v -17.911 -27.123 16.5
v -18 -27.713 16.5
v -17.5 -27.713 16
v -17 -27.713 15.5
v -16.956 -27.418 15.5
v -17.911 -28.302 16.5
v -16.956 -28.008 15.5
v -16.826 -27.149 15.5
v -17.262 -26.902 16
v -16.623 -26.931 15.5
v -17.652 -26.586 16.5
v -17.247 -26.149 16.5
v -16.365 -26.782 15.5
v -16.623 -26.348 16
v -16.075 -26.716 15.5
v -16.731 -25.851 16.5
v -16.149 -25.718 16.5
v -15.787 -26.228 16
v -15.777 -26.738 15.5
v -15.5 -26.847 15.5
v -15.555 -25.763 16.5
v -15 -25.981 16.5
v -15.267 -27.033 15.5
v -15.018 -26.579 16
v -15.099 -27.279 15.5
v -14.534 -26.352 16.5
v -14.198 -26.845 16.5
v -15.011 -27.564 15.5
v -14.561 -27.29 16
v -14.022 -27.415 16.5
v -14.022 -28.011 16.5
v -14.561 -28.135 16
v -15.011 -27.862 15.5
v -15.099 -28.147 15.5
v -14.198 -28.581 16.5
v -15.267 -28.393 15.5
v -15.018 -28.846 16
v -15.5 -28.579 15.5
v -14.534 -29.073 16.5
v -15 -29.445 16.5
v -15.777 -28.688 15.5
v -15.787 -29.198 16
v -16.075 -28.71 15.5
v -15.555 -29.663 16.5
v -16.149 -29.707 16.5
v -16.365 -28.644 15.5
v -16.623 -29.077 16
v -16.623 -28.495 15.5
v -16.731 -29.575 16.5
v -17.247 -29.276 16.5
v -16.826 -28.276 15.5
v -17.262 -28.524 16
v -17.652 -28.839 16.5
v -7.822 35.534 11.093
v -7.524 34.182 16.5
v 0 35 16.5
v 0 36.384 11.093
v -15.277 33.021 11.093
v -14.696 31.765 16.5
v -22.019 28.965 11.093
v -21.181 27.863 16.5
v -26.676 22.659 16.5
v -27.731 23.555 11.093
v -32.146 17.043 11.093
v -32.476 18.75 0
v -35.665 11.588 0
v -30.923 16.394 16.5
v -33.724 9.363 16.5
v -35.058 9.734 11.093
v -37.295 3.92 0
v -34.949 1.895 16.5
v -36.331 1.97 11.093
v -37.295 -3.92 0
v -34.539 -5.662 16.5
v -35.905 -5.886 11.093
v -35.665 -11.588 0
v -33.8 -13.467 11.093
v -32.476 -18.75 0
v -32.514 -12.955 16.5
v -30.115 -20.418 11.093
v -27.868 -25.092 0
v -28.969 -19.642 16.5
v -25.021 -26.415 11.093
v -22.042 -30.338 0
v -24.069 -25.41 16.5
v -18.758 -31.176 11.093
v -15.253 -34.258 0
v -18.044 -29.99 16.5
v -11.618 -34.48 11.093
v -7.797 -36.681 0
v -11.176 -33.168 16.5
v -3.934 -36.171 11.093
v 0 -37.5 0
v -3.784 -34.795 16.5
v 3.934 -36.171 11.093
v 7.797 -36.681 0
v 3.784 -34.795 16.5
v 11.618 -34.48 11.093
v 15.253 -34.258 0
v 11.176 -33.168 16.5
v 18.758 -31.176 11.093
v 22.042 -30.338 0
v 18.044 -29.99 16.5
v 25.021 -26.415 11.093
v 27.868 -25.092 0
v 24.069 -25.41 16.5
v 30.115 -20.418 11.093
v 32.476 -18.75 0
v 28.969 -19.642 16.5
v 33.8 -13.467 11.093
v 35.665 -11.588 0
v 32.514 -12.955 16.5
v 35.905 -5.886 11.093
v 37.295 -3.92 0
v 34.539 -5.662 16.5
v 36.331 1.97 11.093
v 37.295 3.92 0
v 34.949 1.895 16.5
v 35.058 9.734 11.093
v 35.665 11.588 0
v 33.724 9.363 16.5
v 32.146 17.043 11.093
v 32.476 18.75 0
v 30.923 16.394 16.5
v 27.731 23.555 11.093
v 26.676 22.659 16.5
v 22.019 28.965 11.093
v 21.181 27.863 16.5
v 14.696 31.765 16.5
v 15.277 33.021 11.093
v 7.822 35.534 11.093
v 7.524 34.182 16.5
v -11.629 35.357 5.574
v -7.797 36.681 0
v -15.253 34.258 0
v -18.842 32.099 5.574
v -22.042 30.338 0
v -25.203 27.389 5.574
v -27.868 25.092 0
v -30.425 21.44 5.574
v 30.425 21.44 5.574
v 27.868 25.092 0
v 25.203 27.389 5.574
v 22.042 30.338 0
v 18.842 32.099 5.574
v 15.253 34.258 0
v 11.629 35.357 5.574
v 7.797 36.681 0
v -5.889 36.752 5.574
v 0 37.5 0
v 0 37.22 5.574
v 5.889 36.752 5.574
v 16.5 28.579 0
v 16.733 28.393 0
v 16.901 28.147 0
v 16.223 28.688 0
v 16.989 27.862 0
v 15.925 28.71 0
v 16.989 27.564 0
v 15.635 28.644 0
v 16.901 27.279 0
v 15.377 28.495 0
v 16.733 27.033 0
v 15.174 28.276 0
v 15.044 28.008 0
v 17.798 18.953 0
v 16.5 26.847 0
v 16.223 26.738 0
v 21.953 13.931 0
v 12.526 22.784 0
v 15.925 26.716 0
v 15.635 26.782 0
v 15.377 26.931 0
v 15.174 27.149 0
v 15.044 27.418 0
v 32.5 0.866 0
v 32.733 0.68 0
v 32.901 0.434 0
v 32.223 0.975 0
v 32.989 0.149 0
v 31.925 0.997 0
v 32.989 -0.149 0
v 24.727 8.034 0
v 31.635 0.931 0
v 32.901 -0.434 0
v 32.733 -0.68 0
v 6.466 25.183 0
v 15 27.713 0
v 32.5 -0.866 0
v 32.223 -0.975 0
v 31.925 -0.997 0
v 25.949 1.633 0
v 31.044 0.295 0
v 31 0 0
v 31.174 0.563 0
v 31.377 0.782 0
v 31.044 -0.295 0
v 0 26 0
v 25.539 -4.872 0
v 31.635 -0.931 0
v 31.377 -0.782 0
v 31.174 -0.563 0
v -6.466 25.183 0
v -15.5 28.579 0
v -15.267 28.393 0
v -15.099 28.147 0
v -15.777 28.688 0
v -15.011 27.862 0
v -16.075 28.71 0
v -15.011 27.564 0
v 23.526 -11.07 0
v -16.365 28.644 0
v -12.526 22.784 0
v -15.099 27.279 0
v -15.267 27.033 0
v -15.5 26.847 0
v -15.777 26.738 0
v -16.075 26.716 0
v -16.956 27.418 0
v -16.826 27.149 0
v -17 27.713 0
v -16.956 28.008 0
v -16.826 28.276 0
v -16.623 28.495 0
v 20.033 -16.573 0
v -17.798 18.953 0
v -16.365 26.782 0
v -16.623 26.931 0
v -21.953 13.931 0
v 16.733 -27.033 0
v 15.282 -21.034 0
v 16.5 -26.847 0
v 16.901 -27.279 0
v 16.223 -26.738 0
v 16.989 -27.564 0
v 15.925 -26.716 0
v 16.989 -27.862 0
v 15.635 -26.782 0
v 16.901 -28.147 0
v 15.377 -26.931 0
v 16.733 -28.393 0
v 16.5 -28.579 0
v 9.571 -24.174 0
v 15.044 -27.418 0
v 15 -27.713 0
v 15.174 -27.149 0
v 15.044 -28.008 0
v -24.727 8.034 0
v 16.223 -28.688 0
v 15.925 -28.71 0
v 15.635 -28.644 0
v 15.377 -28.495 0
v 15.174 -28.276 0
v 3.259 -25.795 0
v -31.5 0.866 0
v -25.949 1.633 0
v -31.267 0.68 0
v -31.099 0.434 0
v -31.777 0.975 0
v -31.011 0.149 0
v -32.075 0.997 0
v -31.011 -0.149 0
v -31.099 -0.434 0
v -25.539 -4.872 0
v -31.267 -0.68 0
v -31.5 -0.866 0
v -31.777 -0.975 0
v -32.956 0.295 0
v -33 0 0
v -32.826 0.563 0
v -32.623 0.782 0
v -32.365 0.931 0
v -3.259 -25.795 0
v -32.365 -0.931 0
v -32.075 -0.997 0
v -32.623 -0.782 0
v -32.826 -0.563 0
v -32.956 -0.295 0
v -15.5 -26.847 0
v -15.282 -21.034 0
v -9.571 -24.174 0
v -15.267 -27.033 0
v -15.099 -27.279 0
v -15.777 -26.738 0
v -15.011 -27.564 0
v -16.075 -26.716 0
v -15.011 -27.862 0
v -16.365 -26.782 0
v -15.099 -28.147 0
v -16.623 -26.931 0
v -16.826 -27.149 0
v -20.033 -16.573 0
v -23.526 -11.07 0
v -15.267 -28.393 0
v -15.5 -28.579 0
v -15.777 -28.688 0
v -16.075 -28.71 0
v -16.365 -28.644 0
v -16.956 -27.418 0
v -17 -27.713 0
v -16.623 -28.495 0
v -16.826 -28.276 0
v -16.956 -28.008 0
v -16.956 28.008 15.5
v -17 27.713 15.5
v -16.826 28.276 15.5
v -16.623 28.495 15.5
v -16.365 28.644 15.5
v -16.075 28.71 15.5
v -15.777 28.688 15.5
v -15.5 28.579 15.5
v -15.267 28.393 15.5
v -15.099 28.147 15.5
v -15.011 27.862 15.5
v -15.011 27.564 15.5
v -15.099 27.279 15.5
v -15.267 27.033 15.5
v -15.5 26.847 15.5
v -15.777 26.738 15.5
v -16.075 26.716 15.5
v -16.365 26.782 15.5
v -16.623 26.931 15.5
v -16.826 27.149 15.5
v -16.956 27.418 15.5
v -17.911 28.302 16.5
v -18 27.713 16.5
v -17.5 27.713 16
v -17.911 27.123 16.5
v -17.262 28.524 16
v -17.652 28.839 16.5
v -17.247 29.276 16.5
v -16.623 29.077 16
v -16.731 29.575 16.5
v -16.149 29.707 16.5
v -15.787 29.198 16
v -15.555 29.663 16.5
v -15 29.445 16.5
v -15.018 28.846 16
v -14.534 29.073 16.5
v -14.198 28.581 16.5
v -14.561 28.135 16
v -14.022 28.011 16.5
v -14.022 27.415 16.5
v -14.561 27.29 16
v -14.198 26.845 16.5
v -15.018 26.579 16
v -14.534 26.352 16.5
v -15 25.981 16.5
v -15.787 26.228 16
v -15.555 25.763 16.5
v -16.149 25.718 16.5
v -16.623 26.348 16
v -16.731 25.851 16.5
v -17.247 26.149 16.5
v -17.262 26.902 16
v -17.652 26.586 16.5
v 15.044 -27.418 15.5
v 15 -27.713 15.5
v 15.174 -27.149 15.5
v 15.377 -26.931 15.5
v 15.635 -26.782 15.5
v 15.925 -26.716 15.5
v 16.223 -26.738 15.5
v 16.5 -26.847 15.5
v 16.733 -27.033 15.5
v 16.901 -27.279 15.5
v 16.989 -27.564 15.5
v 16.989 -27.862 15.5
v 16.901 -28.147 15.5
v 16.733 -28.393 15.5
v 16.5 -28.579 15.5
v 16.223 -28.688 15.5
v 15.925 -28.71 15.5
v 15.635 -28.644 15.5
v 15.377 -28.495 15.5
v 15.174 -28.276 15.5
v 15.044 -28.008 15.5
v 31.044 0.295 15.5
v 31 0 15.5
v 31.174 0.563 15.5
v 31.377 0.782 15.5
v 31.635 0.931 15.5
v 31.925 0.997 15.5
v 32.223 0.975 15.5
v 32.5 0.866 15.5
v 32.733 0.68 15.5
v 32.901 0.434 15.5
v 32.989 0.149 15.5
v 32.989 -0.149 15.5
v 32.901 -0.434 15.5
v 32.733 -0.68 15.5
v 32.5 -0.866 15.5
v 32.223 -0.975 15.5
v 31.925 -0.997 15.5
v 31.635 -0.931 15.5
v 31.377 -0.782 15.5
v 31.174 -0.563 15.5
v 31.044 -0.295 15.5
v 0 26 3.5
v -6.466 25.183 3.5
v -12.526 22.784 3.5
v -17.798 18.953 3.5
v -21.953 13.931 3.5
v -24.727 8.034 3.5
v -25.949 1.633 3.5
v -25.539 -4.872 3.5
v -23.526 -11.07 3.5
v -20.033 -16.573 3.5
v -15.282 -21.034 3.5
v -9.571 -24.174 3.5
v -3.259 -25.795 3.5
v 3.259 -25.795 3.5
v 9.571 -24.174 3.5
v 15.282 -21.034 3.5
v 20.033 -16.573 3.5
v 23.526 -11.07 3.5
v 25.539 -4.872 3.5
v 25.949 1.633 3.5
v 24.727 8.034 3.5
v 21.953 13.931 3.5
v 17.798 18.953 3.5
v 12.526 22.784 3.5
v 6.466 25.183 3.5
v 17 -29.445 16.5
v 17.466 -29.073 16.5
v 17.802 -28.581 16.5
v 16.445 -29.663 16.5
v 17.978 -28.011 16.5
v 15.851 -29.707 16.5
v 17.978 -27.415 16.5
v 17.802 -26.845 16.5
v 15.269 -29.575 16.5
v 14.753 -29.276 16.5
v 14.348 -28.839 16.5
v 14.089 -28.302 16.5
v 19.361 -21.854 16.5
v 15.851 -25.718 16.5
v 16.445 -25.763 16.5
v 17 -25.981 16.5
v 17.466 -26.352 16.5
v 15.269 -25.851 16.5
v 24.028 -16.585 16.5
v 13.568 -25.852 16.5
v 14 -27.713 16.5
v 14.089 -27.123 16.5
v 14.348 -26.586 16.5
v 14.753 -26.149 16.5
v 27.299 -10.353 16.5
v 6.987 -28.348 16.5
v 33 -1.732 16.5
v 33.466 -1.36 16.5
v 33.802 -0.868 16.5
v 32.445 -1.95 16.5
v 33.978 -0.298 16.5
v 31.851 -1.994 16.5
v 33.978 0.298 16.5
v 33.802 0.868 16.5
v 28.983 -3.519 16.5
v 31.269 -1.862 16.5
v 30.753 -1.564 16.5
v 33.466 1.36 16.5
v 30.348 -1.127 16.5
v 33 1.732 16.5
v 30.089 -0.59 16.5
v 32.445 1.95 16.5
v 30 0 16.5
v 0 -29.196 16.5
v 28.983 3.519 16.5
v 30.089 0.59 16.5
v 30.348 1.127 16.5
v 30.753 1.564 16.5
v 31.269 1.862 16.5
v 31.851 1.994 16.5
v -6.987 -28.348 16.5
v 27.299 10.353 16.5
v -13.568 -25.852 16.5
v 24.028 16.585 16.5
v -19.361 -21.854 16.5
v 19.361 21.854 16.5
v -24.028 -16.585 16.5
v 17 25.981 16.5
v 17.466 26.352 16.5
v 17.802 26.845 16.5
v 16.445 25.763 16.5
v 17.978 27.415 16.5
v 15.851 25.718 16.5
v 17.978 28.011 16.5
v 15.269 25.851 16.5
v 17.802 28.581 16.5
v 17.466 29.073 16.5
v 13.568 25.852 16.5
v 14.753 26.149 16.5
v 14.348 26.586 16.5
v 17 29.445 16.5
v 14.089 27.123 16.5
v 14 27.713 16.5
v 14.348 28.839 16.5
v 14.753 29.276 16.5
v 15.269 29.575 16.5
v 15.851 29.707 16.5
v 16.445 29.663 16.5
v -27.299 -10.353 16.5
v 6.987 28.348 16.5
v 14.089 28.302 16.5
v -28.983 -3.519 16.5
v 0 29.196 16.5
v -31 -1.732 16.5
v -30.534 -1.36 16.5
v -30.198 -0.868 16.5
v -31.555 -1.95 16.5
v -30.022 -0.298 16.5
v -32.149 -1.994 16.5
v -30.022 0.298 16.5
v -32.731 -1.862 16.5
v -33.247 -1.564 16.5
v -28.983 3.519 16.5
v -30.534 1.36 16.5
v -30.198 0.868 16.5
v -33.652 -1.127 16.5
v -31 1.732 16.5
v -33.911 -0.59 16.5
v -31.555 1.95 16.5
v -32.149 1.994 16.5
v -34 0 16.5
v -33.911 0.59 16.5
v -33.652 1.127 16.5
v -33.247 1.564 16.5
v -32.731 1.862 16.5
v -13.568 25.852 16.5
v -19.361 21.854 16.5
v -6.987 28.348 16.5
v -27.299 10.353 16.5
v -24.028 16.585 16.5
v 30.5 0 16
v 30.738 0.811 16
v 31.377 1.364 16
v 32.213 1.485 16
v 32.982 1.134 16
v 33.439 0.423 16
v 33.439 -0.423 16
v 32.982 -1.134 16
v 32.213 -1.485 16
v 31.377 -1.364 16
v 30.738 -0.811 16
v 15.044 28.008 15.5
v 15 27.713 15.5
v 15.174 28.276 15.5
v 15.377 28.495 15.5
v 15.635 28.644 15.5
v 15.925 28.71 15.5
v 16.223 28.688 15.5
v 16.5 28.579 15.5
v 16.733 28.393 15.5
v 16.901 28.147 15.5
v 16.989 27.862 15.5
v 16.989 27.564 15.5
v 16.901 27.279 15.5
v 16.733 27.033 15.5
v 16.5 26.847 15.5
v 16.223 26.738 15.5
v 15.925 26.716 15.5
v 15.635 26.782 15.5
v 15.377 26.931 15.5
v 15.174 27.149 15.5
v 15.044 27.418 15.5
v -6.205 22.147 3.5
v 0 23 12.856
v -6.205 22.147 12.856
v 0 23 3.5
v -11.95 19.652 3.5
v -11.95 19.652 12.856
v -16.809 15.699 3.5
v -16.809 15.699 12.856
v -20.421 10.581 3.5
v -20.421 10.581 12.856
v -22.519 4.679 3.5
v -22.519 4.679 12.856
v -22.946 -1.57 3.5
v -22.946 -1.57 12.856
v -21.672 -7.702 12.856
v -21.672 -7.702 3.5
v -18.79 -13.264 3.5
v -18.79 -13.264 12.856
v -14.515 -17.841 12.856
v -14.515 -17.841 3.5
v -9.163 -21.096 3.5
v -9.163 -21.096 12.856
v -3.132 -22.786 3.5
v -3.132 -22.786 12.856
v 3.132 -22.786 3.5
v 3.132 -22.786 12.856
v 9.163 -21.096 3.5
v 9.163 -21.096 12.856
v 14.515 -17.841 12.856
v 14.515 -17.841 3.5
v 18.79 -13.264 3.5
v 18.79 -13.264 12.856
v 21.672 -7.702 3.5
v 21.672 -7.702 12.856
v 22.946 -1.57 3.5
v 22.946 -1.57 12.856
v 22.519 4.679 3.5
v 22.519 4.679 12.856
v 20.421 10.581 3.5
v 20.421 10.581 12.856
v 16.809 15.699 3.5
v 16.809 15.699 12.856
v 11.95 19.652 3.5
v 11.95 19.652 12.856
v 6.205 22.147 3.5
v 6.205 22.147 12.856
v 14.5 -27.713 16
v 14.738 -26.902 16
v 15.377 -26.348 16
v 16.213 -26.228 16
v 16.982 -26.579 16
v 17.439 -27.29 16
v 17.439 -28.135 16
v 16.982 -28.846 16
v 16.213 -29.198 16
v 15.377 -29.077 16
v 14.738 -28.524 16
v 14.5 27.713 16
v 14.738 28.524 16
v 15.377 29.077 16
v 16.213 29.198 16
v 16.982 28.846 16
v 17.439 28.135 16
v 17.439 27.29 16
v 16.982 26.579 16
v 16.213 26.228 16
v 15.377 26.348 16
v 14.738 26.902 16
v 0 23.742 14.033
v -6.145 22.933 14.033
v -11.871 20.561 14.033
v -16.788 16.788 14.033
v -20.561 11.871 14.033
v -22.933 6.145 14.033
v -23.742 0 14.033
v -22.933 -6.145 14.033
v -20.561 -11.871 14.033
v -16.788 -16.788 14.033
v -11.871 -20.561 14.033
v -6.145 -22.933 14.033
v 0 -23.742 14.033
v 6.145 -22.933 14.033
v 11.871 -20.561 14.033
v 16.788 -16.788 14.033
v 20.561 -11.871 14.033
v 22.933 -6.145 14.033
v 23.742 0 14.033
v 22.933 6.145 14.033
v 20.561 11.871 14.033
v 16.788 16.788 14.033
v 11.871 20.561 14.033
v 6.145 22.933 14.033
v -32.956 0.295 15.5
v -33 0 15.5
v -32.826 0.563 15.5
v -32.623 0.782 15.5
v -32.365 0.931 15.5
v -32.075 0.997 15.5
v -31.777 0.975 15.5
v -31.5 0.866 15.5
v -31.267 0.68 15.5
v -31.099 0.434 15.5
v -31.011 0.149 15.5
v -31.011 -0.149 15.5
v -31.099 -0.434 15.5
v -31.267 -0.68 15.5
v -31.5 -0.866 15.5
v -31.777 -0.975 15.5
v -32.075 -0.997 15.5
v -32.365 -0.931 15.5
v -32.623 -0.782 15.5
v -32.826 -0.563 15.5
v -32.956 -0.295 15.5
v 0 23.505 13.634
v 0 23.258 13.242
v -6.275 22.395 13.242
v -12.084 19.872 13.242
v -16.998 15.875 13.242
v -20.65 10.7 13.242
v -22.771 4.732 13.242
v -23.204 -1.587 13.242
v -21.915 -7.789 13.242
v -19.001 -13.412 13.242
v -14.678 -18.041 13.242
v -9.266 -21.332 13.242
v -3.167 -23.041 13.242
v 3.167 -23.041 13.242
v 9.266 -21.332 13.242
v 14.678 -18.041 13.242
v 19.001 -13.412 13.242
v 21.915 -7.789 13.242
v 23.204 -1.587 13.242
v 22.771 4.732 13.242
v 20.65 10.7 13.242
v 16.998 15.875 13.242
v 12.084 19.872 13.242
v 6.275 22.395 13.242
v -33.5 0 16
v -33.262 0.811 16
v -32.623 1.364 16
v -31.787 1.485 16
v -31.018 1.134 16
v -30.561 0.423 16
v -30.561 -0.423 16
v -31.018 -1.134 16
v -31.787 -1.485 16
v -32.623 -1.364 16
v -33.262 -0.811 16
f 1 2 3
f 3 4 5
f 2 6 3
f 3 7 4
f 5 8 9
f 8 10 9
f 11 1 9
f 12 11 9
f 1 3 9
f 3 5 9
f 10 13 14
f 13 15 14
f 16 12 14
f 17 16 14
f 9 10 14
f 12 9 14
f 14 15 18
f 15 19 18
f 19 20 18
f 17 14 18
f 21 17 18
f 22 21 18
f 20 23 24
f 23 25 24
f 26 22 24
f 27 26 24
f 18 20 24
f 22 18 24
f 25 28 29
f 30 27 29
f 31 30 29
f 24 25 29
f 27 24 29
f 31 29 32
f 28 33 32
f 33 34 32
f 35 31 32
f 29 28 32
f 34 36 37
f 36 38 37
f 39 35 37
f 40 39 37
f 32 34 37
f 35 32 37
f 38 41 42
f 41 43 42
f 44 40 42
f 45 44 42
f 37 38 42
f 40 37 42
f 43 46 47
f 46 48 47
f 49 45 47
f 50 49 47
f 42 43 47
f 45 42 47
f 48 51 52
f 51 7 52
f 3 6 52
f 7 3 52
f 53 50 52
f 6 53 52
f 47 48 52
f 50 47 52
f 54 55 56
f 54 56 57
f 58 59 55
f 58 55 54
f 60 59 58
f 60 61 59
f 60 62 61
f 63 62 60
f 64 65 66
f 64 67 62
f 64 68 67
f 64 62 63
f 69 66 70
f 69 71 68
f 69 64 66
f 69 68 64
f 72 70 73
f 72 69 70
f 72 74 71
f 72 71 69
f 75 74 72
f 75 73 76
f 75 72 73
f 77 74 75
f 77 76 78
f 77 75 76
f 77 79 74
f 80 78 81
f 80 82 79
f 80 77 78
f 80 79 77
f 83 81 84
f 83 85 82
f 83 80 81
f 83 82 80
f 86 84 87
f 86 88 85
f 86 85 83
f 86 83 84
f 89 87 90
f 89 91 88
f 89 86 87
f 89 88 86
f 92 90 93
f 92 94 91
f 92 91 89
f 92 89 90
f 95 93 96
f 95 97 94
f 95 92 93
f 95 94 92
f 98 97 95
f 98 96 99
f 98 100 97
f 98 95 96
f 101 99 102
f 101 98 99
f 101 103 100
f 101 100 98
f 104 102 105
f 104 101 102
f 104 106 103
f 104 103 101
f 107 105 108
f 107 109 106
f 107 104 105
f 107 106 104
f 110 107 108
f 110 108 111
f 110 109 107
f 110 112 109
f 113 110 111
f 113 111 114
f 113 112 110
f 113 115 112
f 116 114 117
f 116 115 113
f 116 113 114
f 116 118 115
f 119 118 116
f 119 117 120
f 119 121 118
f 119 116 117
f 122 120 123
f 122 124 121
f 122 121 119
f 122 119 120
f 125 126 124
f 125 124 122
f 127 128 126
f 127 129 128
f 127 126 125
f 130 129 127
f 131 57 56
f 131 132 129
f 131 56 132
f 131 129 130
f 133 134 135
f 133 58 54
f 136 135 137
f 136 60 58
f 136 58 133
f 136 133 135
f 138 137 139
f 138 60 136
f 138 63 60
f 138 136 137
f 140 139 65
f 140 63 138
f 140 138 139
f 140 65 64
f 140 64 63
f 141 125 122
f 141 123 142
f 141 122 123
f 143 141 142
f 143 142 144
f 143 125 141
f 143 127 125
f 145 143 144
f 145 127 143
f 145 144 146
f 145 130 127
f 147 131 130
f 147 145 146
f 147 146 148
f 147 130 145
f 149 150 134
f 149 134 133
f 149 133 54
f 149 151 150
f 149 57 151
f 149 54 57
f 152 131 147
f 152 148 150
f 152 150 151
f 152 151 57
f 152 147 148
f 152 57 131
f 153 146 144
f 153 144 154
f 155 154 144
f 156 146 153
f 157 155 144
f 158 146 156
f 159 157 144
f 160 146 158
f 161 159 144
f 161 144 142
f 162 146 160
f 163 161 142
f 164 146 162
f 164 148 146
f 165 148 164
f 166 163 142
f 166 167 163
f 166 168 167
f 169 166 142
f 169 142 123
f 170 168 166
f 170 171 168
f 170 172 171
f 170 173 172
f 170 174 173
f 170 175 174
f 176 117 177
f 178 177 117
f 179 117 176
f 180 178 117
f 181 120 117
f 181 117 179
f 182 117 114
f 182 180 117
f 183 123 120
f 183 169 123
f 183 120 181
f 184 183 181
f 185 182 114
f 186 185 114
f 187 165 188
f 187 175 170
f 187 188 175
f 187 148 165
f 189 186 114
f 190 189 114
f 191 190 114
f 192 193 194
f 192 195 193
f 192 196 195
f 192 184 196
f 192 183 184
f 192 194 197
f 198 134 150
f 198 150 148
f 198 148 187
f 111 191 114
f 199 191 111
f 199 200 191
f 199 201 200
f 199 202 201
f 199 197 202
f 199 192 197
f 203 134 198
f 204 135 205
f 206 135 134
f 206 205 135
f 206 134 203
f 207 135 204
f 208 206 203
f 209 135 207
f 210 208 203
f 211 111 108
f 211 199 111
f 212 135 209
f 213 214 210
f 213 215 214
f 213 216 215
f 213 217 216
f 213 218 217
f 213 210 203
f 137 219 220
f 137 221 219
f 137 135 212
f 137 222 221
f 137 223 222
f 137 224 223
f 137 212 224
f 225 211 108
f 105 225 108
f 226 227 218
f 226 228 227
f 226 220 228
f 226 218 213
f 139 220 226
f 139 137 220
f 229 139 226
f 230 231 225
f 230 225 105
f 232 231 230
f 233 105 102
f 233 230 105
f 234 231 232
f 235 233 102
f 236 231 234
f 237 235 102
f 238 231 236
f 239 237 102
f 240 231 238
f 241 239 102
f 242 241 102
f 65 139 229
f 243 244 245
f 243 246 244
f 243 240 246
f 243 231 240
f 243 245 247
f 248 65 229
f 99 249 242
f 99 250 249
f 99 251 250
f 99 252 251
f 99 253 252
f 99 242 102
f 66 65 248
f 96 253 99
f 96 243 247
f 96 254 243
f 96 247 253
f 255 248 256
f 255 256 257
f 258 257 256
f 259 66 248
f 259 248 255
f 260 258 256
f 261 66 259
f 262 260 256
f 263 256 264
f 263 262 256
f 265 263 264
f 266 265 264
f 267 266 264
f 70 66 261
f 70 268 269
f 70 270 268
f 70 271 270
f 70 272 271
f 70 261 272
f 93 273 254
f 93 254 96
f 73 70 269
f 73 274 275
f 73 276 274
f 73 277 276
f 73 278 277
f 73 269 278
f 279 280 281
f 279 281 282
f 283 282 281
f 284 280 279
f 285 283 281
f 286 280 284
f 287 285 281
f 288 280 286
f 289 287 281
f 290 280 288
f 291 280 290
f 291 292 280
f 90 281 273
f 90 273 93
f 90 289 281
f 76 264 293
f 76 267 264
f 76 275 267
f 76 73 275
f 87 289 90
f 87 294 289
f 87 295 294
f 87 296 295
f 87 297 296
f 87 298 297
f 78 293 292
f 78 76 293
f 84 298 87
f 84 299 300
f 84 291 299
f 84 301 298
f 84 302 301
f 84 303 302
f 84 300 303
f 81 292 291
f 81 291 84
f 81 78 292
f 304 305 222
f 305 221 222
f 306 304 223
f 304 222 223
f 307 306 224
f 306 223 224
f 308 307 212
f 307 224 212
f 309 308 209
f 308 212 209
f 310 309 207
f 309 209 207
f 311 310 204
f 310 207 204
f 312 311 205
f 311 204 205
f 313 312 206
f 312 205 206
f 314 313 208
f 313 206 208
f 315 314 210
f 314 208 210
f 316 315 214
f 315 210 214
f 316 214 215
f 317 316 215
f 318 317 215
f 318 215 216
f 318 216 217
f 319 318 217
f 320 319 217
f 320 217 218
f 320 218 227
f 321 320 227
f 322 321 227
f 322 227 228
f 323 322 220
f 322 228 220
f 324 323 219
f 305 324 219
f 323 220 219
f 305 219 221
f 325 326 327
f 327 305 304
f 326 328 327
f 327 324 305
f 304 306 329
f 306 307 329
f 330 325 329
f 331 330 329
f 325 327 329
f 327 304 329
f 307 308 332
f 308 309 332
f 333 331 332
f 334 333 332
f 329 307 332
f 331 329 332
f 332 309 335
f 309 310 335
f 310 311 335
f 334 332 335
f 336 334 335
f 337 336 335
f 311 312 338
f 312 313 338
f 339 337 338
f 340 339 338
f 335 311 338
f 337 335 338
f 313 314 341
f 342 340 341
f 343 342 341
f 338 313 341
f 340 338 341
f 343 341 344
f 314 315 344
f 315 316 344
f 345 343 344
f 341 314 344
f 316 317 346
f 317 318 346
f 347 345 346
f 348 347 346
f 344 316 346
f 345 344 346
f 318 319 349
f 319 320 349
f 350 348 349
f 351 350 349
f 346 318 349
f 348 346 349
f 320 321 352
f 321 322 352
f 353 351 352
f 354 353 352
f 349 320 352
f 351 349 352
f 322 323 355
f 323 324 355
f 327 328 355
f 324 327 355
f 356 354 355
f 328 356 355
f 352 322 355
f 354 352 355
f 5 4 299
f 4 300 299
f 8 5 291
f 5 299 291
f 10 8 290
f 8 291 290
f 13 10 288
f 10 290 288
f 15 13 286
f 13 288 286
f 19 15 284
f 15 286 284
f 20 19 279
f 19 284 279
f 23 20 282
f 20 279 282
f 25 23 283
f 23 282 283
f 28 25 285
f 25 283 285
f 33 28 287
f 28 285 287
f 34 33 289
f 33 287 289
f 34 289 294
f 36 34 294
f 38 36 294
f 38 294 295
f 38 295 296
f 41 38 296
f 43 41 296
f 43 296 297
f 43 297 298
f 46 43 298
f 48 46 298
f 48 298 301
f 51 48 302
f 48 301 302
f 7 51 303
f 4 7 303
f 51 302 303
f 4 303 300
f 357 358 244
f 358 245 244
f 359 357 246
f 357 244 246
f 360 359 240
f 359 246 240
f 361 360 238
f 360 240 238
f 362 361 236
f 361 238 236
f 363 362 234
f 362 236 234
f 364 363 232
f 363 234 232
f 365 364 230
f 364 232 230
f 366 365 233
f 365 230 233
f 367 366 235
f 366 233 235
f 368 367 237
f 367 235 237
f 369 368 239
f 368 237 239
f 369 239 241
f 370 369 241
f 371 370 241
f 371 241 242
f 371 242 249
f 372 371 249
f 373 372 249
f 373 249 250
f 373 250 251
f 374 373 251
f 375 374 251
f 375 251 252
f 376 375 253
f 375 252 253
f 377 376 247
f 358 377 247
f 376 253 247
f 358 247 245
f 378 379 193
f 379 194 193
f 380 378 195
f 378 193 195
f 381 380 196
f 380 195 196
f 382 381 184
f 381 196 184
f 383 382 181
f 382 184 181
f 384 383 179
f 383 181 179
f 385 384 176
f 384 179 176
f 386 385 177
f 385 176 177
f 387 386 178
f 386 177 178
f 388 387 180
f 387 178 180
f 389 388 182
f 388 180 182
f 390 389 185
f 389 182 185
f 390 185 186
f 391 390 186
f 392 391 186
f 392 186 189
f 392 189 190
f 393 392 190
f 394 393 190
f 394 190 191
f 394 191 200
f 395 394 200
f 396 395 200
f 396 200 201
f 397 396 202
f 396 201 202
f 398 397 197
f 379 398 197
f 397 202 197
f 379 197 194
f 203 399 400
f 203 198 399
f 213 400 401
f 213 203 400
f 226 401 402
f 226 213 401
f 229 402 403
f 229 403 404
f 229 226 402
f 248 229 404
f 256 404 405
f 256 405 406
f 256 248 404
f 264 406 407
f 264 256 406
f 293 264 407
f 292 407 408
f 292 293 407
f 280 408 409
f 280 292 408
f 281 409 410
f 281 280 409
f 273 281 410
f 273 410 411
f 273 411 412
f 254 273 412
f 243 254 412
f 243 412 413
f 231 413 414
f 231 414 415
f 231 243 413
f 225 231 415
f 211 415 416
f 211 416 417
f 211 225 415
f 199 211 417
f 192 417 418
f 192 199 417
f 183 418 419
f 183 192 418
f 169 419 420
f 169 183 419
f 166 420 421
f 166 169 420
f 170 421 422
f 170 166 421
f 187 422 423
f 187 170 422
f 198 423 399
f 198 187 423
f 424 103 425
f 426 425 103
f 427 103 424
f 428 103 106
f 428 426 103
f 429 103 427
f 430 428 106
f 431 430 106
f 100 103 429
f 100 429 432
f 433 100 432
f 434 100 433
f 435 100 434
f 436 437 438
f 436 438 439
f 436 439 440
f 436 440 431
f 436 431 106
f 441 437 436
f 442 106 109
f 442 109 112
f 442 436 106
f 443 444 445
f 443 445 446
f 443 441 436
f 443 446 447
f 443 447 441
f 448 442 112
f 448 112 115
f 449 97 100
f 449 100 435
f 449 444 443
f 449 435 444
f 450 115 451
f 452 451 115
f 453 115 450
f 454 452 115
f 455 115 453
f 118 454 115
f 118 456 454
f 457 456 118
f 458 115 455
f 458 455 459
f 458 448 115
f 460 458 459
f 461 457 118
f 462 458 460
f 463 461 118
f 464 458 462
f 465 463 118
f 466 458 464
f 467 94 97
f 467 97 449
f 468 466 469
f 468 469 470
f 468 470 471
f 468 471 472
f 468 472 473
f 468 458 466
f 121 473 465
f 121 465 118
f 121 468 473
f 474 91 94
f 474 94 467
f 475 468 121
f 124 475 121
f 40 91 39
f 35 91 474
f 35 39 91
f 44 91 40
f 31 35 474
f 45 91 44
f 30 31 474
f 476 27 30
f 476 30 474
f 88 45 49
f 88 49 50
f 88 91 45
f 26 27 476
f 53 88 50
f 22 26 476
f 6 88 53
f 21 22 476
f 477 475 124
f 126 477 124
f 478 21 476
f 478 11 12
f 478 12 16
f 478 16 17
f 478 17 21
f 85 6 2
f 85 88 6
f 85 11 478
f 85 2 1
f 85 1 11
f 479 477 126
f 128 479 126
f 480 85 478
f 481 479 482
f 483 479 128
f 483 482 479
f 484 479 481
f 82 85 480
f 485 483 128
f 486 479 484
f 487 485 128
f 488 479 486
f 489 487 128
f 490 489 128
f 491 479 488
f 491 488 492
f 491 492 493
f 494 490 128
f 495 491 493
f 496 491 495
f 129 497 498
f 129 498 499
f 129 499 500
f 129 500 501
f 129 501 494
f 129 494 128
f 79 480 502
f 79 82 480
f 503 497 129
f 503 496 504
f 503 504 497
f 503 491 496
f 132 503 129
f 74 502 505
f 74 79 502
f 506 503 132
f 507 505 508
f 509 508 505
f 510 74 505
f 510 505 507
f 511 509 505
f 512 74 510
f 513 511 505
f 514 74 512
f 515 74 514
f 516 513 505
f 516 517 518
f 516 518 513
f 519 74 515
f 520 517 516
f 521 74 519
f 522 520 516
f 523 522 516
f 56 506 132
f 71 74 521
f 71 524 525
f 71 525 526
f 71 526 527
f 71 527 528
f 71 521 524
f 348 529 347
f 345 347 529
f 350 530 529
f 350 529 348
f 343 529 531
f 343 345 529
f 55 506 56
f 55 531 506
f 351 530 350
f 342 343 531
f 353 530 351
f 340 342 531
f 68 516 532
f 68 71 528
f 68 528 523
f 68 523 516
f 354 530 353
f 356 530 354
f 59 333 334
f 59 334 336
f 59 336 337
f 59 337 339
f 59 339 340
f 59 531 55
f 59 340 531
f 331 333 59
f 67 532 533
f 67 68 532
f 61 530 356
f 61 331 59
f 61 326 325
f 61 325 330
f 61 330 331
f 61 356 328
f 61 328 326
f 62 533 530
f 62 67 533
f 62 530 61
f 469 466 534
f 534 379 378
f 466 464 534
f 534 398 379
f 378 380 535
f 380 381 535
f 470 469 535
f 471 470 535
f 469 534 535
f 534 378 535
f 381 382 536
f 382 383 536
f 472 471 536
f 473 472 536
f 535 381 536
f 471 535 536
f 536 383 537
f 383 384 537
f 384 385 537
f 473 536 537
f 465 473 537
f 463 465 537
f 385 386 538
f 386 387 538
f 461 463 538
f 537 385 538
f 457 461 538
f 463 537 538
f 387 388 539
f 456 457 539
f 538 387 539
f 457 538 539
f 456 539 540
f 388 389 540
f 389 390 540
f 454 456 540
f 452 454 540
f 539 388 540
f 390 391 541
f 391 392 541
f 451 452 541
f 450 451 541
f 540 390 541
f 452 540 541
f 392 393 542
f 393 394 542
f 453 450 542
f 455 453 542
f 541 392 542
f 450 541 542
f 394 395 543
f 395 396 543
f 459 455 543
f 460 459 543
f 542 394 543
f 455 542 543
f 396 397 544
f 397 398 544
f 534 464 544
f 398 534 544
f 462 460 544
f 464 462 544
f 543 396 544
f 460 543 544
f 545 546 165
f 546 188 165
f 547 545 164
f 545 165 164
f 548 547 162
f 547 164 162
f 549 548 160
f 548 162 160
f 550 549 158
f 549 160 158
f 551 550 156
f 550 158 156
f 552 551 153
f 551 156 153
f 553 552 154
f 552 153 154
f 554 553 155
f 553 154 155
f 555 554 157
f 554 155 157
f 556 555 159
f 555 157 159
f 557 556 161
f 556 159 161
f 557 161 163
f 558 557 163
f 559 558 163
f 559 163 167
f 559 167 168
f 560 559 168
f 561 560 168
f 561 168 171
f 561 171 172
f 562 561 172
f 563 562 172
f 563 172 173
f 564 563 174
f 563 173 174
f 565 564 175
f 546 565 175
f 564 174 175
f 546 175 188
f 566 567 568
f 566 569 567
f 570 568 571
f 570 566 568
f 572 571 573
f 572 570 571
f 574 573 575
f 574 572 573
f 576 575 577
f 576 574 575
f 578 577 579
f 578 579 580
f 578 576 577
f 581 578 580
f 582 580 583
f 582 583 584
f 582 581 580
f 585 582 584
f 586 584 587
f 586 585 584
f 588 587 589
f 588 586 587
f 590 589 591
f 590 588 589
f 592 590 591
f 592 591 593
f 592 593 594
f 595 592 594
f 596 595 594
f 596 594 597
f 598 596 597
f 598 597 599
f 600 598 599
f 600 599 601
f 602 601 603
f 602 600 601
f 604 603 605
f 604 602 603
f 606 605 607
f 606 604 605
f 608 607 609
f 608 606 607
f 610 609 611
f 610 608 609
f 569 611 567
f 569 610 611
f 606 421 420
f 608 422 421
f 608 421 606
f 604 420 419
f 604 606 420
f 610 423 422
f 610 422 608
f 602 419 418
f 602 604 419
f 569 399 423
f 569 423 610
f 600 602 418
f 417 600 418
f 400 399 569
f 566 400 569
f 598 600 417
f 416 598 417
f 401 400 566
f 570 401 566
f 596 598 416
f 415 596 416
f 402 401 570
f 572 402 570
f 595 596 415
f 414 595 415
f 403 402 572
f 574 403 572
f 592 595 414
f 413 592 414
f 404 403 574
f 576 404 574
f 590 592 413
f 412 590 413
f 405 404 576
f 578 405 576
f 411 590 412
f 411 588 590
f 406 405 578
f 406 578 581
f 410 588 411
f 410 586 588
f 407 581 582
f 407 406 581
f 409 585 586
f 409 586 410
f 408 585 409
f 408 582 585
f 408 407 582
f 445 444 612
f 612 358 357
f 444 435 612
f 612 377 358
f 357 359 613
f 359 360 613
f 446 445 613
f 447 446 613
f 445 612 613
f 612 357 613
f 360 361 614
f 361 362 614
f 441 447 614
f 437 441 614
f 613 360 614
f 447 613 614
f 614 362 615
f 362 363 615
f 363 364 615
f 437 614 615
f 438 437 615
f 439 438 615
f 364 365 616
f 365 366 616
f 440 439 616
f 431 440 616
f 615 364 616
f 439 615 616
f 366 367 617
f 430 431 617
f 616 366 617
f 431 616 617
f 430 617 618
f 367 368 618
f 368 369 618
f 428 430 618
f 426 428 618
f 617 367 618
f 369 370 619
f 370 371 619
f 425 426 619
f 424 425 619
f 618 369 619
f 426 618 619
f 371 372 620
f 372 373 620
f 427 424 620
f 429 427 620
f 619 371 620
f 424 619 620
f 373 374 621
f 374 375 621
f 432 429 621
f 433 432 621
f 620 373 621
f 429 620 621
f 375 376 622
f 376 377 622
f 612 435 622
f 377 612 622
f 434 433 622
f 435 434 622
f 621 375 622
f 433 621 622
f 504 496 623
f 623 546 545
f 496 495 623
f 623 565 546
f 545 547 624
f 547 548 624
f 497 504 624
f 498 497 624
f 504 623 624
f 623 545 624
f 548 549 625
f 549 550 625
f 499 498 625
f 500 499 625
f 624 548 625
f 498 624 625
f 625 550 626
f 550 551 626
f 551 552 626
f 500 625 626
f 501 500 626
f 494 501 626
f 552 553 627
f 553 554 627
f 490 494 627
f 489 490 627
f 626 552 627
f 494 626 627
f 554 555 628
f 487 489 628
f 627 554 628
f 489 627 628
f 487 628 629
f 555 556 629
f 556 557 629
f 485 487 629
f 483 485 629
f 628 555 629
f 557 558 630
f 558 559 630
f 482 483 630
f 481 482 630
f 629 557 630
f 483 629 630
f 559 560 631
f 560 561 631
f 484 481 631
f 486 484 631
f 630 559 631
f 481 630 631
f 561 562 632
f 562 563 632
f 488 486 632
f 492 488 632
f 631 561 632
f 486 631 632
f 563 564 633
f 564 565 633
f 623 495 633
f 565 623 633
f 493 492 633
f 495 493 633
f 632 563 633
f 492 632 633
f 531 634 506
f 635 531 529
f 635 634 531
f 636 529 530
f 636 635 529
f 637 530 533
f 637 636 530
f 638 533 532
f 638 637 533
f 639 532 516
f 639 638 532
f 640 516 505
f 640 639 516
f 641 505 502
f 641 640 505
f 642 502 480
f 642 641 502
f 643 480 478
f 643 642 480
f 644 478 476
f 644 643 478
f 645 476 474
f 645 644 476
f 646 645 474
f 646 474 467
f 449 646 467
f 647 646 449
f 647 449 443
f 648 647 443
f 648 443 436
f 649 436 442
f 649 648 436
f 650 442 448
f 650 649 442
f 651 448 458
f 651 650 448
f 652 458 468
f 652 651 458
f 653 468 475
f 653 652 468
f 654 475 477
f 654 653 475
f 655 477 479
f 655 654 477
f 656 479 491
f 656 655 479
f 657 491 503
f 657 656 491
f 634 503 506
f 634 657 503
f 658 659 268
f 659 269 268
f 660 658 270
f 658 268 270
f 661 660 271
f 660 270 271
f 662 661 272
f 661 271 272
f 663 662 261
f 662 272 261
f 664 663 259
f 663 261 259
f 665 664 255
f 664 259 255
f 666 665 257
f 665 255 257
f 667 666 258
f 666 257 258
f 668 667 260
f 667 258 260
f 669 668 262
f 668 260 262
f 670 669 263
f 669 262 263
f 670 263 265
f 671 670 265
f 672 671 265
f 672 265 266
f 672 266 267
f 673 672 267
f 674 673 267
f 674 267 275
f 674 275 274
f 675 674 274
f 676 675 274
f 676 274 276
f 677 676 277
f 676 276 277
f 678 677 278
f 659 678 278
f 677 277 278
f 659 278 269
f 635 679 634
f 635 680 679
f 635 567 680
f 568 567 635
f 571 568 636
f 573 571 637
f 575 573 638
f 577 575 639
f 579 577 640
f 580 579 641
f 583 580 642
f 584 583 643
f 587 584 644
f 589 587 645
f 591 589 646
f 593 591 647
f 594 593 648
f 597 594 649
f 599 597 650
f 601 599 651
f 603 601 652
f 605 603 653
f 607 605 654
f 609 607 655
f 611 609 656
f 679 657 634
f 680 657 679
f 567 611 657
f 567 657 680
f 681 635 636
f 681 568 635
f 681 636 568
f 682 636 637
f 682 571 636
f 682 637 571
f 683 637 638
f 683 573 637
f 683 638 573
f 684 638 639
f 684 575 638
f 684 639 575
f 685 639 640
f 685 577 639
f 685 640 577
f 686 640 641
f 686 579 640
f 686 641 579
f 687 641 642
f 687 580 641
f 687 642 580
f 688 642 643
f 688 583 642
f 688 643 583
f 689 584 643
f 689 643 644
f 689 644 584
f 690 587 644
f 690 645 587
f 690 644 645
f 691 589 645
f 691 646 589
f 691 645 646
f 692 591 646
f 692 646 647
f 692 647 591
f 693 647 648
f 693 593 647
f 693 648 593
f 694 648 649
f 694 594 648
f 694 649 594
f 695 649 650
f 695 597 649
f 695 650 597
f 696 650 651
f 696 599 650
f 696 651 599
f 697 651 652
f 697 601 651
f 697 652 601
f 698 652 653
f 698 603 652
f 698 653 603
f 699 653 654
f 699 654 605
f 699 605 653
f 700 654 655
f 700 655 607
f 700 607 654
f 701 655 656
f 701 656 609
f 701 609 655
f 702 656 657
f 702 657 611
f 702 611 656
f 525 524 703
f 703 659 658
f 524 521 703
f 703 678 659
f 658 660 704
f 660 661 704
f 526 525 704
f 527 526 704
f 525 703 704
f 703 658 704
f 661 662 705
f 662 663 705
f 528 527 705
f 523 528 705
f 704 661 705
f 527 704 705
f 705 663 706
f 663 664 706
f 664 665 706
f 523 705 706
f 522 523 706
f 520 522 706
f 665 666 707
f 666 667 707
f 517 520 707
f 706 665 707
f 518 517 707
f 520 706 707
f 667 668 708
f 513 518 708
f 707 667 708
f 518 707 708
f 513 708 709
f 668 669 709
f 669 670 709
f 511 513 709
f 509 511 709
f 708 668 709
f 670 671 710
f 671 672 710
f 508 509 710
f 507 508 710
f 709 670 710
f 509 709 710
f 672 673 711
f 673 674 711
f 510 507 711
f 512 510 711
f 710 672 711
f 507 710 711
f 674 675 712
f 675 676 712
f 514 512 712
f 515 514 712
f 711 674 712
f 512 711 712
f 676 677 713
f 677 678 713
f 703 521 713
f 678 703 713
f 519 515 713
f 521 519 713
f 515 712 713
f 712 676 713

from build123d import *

# Parameters (mm, degrees)
FASE1_SIZE             = 4.290340475
M2_SENKUNG_D           = 2
M2_SENKUNG_CSINK_D     = 4
M2_SENKUNG_CSINK_ANGLE = 90


with BuildPart() as part:
    # Skizze1 → Rotation (revolve)
    with BuildSketch(Plane(origin=(0, 0, 0), x_dir=(0, 0, -1), z_dir=(1, 0, 0))):
        with BuildLine():
            Line((0, 26), (0, 37.5))
            ThreePointArc((0, 37.5), (-8.344159634, 36.871453585), (-16.5, 35))
            Line((-16.5, 35), (-16.5, 24.905973721))
            ThreePointArc((-16.5, 24.905973721), (-14.620334002, 24.063560793), (-12.856349239, 23))
            Line((-12.856349239, 23), (-3.5, 23))
            Line((-3.5, 23), (-3.5, 26))
            Line((-3.5, 26), (0, 26))
        make_face()
    revolve(axis=Axis((0, 0, -11.01172812), (0, 0, 1)))

    # Fase1
    # the kernel refuses this chamfer: 4.290340475, 2.5 mm, written as the material it takes off along each edge
    with BuildSketch(Plane(origin=(0, 0, 16.5), x_dir=(0, 1, 0), z_dir=(1, 0, 0))) as fase1_piece_1:
        with BuildLine():
            Line((24.905973721 + FASE1_SIZE, 0), (23.741652955, -2.466620822))
            ThreePointArc((23.741652955, -2.466620822), (24.345172312, -1.316125117), (24.905973721, 0))
            Line((24.905973721, 0), (24.905973721 + FASE1_SIZE, 0))
        make_face()
    revolve(axis=Axis((0, 0, 16.5), (0, 0, 1)), mode=Mode.SUBTRACT)

    # M2 Senkung (through all)
    with Locations(Plane.XY.offset(16.5)):
        with Locations((-16, 27.712812921), (16, 27.712812921), (32, 0), (16, -27.712812921), (-16, -27.712812921), (-32, 0)):
            CounterSinkHole(M2_SENKUNG_D / 2, M2_SENKUNG_CSINK_D / 2, counter_sink_angle=M2_SENKUNG_CSINK_ANGLE)


solid = part.part
